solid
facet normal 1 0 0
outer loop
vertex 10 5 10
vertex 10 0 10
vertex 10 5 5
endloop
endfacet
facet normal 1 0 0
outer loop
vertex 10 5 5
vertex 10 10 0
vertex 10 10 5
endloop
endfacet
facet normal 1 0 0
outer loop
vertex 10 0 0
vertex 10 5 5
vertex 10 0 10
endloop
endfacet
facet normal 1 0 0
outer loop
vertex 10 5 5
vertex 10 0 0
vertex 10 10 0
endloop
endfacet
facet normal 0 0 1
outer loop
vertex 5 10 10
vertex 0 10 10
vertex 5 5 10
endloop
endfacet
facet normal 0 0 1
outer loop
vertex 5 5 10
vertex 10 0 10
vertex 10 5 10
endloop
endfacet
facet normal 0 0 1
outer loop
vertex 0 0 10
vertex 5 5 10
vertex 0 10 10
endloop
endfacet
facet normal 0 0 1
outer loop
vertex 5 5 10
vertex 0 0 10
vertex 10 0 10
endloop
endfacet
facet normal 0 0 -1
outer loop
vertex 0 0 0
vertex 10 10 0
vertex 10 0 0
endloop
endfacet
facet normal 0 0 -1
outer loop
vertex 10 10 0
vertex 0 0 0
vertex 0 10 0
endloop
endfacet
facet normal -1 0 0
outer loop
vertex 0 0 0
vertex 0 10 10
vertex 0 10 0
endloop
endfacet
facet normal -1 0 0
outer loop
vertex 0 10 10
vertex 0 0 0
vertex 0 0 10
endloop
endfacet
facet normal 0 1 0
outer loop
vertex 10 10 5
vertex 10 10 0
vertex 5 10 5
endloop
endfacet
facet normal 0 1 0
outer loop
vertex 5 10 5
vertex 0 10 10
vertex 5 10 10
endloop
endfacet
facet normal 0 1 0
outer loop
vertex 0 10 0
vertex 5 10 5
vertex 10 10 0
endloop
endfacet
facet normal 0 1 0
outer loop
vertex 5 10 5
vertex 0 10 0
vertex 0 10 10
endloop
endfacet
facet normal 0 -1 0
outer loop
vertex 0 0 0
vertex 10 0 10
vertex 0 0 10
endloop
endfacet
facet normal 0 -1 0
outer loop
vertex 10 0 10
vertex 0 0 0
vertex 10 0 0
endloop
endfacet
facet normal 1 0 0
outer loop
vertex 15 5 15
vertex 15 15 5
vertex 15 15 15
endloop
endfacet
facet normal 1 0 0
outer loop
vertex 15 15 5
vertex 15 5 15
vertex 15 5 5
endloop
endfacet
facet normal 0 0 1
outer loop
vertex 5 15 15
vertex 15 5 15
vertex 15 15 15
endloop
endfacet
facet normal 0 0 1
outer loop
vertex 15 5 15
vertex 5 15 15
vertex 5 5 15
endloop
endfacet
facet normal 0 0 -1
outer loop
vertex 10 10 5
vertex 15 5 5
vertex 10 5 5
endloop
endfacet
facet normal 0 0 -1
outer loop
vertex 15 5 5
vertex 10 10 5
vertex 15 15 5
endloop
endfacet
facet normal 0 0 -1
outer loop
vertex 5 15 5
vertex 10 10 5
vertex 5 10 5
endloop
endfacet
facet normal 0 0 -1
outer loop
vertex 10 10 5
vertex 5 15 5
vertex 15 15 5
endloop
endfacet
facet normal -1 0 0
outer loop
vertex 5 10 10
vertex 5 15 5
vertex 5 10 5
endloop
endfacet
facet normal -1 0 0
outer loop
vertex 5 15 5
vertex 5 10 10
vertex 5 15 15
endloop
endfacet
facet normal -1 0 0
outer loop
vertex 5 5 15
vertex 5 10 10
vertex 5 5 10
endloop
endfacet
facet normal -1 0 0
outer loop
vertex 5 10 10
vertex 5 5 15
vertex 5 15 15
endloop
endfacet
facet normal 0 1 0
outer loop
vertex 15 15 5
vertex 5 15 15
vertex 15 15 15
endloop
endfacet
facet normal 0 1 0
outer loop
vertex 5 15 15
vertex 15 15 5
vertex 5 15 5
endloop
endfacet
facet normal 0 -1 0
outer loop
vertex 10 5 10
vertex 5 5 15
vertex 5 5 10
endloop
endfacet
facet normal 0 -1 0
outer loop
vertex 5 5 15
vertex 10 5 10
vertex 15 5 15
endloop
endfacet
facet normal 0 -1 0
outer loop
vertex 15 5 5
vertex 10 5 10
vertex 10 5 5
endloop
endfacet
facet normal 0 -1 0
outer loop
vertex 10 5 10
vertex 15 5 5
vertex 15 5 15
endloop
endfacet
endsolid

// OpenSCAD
// The exact-geometry audit's case b01 (docs/audits/exact-geometry-rust.md).
// volume: 1875.0
union() { cube(10); translate([5,5,5]) cube(10); }
